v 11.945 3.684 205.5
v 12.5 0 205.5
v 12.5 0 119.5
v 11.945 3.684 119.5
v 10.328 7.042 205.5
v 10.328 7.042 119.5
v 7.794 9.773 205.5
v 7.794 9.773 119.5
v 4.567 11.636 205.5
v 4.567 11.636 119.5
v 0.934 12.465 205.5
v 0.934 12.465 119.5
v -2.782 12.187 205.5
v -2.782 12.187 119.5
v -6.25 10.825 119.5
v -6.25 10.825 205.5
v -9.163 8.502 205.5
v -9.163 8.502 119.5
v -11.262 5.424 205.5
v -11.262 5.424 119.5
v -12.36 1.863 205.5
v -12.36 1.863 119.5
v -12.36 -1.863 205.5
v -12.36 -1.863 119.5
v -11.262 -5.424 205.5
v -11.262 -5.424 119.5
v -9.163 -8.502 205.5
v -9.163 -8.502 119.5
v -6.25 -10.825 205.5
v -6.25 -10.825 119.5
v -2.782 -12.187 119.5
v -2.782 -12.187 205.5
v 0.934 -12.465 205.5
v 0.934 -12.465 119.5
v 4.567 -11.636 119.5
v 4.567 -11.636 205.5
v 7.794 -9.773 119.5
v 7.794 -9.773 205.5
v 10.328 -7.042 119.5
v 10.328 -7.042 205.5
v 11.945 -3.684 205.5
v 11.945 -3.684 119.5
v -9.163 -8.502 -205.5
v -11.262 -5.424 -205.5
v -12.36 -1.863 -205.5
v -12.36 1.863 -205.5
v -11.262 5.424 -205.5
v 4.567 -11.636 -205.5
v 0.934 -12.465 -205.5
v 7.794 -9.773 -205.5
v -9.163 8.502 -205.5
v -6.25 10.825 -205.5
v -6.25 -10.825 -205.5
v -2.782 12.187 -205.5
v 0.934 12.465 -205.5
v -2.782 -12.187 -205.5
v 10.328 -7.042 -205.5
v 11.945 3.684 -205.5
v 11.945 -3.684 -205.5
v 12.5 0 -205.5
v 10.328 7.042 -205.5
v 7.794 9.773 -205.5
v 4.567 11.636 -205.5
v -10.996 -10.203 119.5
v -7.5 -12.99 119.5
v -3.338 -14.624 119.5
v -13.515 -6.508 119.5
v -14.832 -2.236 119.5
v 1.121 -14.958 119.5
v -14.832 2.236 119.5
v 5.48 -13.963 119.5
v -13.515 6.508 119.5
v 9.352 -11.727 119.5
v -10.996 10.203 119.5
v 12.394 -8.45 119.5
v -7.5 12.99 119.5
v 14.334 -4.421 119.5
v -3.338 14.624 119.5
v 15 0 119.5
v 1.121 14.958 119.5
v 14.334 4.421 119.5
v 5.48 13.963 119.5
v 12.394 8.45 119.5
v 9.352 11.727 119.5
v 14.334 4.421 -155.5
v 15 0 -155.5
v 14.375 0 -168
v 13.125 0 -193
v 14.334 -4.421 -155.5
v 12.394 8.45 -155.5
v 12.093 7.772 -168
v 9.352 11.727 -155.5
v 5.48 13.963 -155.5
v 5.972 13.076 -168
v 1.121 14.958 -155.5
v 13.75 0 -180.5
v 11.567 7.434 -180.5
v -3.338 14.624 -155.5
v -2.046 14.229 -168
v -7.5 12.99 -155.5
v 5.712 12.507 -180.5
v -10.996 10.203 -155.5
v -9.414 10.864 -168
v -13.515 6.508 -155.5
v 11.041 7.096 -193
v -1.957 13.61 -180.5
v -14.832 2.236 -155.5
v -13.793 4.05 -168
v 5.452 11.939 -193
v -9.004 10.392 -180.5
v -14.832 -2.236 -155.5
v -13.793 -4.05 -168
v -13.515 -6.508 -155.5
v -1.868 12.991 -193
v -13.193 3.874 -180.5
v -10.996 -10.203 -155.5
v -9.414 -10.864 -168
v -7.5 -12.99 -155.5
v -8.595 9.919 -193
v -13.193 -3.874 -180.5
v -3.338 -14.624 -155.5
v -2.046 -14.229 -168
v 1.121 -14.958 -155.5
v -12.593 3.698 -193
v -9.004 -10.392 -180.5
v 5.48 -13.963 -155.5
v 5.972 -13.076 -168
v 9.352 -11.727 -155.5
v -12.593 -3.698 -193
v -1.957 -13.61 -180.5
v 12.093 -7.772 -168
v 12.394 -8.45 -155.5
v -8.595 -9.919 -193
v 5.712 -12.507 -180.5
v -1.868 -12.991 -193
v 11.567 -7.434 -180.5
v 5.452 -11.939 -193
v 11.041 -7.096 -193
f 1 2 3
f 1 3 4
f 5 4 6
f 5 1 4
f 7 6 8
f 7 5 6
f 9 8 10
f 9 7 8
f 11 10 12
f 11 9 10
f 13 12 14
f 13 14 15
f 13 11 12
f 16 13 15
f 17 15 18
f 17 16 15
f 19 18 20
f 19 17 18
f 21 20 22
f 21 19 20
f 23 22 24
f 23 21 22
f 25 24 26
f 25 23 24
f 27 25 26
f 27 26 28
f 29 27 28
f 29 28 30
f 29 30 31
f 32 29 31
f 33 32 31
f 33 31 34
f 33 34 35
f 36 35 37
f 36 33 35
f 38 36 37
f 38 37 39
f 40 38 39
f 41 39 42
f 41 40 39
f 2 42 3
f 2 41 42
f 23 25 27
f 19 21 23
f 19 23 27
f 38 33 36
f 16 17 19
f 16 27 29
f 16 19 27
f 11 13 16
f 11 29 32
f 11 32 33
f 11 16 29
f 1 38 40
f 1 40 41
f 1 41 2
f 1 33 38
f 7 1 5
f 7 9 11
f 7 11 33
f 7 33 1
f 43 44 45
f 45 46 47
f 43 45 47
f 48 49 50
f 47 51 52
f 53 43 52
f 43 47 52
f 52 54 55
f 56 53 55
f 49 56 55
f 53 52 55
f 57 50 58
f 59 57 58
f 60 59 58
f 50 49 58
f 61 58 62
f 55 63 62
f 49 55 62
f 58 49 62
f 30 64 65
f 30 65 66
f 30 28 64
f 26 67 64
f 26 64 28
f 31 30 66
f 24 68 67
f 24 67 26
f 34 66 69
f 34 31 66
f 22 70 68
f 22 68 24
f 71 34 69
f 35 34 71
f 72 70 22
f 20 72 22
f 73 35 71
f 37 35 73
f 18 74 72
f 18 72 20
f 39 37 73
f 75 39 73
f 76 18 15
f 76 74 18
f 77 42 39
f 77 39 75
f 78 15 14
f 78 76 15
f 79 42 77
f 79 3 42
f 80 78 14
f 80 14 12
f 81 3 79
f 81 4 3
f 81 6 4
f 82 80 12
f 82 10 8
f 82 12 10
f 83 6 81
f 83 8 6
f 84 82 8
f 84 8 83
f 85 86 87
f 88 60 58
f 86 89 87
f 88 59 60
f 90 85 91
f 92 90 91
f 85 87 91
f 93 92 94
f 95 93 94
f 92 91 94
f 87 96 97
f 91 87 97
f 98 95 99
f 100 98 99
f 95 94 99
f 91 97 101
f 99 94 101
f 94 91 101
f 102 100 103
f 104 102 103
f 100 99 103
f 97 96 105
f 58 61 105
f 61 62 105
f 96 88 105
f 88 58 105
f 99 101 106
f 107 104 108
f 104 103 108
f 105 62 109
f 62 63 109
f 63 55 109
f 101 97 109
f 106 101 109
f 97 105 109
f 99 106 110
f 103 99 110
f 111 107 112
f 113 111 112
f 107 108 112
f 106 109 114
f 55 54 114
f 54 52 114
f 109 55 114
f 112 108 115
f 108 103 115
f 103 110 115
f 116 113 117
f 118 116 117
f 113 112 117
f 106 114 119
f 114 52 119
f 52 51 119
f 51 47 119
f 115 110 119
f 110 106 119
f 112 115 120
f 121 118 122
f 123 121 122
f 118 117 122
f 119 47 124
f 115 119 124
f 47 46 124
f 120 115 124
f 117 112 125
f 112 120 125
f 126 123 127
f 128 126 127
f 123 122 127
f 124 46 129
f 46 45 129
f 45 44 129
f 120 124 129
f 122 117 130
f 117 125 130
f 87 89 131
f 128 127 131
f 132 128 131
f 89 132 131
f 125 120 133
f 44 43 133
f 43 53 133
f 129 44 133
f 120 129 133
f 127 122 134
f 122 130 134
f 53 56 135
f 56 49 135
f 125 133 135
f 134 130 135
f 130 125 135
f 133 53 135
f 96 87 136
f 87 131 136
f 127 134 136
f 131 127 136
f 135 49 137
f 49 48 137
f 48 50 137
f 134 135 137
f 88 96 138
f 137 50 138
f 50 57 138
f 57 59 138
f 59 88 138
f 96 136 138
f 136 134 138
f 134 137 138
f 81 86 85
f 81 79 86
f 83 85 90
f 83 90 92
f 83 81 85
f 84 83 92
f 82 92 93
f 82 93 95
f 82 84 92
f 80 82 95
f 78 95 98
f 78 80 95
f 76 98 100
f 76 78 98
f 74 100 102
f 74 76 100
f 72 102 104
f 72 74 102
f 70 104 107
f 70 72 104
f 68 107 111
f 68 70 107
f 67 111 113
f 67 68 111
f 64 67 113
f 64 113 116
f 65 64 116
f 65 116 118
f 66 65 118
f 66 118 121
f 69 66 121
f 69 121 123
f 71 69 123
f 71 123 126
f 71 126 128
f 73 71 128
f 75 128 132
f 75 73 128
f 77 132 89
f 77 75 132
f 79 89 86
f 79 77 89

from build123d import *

# Parameters (mm, degrees)
SKETCH_1_R          = 15
EXTRUDE_1_DEPTH     = 205.5
SKETCH_2_R          = 15
SKETCH_2_R_2        = 12.5
CUT_EXTRUDE_1_DEPTH = 86


# Read off the part's stored shape, not the designer's step: 切除-旋转3
with BuildPart() as part:
    # 草图1 → 凸台-拉伸1 (new, symmetric)
    with BuildSketch(Plane.XY):
        Circle(SKETCH_1_R)
    extrude(amount=EXTRUDE_1_DEPTH, both=True)

    # 草图2 → 切除-拉伸1 (cut)
    with BuildSketch(Plane.XY.offset(205.5)):
        Circle(SKETCH_2_R)
        Circle(SKETCH_2_R_2, mode=Mode.SUBTRACT)
    extrude(amount=-CUT_EXTRUDE_1_DEPTH, mode=Mode.SUBTRACT)

    # 切除-旋转3 outline → 切除-旋转3 (revolve, cut)
    with BuildSketch(Plane.XZ):
        Polygon((15, -155.5), (12.5, -205.5), (15, -205.5), align=None)
    revolve(axis=Axis((0, 0, 0), (0, 0, 1)), mode=Mode.SUBTRACT)


solid = part.part
